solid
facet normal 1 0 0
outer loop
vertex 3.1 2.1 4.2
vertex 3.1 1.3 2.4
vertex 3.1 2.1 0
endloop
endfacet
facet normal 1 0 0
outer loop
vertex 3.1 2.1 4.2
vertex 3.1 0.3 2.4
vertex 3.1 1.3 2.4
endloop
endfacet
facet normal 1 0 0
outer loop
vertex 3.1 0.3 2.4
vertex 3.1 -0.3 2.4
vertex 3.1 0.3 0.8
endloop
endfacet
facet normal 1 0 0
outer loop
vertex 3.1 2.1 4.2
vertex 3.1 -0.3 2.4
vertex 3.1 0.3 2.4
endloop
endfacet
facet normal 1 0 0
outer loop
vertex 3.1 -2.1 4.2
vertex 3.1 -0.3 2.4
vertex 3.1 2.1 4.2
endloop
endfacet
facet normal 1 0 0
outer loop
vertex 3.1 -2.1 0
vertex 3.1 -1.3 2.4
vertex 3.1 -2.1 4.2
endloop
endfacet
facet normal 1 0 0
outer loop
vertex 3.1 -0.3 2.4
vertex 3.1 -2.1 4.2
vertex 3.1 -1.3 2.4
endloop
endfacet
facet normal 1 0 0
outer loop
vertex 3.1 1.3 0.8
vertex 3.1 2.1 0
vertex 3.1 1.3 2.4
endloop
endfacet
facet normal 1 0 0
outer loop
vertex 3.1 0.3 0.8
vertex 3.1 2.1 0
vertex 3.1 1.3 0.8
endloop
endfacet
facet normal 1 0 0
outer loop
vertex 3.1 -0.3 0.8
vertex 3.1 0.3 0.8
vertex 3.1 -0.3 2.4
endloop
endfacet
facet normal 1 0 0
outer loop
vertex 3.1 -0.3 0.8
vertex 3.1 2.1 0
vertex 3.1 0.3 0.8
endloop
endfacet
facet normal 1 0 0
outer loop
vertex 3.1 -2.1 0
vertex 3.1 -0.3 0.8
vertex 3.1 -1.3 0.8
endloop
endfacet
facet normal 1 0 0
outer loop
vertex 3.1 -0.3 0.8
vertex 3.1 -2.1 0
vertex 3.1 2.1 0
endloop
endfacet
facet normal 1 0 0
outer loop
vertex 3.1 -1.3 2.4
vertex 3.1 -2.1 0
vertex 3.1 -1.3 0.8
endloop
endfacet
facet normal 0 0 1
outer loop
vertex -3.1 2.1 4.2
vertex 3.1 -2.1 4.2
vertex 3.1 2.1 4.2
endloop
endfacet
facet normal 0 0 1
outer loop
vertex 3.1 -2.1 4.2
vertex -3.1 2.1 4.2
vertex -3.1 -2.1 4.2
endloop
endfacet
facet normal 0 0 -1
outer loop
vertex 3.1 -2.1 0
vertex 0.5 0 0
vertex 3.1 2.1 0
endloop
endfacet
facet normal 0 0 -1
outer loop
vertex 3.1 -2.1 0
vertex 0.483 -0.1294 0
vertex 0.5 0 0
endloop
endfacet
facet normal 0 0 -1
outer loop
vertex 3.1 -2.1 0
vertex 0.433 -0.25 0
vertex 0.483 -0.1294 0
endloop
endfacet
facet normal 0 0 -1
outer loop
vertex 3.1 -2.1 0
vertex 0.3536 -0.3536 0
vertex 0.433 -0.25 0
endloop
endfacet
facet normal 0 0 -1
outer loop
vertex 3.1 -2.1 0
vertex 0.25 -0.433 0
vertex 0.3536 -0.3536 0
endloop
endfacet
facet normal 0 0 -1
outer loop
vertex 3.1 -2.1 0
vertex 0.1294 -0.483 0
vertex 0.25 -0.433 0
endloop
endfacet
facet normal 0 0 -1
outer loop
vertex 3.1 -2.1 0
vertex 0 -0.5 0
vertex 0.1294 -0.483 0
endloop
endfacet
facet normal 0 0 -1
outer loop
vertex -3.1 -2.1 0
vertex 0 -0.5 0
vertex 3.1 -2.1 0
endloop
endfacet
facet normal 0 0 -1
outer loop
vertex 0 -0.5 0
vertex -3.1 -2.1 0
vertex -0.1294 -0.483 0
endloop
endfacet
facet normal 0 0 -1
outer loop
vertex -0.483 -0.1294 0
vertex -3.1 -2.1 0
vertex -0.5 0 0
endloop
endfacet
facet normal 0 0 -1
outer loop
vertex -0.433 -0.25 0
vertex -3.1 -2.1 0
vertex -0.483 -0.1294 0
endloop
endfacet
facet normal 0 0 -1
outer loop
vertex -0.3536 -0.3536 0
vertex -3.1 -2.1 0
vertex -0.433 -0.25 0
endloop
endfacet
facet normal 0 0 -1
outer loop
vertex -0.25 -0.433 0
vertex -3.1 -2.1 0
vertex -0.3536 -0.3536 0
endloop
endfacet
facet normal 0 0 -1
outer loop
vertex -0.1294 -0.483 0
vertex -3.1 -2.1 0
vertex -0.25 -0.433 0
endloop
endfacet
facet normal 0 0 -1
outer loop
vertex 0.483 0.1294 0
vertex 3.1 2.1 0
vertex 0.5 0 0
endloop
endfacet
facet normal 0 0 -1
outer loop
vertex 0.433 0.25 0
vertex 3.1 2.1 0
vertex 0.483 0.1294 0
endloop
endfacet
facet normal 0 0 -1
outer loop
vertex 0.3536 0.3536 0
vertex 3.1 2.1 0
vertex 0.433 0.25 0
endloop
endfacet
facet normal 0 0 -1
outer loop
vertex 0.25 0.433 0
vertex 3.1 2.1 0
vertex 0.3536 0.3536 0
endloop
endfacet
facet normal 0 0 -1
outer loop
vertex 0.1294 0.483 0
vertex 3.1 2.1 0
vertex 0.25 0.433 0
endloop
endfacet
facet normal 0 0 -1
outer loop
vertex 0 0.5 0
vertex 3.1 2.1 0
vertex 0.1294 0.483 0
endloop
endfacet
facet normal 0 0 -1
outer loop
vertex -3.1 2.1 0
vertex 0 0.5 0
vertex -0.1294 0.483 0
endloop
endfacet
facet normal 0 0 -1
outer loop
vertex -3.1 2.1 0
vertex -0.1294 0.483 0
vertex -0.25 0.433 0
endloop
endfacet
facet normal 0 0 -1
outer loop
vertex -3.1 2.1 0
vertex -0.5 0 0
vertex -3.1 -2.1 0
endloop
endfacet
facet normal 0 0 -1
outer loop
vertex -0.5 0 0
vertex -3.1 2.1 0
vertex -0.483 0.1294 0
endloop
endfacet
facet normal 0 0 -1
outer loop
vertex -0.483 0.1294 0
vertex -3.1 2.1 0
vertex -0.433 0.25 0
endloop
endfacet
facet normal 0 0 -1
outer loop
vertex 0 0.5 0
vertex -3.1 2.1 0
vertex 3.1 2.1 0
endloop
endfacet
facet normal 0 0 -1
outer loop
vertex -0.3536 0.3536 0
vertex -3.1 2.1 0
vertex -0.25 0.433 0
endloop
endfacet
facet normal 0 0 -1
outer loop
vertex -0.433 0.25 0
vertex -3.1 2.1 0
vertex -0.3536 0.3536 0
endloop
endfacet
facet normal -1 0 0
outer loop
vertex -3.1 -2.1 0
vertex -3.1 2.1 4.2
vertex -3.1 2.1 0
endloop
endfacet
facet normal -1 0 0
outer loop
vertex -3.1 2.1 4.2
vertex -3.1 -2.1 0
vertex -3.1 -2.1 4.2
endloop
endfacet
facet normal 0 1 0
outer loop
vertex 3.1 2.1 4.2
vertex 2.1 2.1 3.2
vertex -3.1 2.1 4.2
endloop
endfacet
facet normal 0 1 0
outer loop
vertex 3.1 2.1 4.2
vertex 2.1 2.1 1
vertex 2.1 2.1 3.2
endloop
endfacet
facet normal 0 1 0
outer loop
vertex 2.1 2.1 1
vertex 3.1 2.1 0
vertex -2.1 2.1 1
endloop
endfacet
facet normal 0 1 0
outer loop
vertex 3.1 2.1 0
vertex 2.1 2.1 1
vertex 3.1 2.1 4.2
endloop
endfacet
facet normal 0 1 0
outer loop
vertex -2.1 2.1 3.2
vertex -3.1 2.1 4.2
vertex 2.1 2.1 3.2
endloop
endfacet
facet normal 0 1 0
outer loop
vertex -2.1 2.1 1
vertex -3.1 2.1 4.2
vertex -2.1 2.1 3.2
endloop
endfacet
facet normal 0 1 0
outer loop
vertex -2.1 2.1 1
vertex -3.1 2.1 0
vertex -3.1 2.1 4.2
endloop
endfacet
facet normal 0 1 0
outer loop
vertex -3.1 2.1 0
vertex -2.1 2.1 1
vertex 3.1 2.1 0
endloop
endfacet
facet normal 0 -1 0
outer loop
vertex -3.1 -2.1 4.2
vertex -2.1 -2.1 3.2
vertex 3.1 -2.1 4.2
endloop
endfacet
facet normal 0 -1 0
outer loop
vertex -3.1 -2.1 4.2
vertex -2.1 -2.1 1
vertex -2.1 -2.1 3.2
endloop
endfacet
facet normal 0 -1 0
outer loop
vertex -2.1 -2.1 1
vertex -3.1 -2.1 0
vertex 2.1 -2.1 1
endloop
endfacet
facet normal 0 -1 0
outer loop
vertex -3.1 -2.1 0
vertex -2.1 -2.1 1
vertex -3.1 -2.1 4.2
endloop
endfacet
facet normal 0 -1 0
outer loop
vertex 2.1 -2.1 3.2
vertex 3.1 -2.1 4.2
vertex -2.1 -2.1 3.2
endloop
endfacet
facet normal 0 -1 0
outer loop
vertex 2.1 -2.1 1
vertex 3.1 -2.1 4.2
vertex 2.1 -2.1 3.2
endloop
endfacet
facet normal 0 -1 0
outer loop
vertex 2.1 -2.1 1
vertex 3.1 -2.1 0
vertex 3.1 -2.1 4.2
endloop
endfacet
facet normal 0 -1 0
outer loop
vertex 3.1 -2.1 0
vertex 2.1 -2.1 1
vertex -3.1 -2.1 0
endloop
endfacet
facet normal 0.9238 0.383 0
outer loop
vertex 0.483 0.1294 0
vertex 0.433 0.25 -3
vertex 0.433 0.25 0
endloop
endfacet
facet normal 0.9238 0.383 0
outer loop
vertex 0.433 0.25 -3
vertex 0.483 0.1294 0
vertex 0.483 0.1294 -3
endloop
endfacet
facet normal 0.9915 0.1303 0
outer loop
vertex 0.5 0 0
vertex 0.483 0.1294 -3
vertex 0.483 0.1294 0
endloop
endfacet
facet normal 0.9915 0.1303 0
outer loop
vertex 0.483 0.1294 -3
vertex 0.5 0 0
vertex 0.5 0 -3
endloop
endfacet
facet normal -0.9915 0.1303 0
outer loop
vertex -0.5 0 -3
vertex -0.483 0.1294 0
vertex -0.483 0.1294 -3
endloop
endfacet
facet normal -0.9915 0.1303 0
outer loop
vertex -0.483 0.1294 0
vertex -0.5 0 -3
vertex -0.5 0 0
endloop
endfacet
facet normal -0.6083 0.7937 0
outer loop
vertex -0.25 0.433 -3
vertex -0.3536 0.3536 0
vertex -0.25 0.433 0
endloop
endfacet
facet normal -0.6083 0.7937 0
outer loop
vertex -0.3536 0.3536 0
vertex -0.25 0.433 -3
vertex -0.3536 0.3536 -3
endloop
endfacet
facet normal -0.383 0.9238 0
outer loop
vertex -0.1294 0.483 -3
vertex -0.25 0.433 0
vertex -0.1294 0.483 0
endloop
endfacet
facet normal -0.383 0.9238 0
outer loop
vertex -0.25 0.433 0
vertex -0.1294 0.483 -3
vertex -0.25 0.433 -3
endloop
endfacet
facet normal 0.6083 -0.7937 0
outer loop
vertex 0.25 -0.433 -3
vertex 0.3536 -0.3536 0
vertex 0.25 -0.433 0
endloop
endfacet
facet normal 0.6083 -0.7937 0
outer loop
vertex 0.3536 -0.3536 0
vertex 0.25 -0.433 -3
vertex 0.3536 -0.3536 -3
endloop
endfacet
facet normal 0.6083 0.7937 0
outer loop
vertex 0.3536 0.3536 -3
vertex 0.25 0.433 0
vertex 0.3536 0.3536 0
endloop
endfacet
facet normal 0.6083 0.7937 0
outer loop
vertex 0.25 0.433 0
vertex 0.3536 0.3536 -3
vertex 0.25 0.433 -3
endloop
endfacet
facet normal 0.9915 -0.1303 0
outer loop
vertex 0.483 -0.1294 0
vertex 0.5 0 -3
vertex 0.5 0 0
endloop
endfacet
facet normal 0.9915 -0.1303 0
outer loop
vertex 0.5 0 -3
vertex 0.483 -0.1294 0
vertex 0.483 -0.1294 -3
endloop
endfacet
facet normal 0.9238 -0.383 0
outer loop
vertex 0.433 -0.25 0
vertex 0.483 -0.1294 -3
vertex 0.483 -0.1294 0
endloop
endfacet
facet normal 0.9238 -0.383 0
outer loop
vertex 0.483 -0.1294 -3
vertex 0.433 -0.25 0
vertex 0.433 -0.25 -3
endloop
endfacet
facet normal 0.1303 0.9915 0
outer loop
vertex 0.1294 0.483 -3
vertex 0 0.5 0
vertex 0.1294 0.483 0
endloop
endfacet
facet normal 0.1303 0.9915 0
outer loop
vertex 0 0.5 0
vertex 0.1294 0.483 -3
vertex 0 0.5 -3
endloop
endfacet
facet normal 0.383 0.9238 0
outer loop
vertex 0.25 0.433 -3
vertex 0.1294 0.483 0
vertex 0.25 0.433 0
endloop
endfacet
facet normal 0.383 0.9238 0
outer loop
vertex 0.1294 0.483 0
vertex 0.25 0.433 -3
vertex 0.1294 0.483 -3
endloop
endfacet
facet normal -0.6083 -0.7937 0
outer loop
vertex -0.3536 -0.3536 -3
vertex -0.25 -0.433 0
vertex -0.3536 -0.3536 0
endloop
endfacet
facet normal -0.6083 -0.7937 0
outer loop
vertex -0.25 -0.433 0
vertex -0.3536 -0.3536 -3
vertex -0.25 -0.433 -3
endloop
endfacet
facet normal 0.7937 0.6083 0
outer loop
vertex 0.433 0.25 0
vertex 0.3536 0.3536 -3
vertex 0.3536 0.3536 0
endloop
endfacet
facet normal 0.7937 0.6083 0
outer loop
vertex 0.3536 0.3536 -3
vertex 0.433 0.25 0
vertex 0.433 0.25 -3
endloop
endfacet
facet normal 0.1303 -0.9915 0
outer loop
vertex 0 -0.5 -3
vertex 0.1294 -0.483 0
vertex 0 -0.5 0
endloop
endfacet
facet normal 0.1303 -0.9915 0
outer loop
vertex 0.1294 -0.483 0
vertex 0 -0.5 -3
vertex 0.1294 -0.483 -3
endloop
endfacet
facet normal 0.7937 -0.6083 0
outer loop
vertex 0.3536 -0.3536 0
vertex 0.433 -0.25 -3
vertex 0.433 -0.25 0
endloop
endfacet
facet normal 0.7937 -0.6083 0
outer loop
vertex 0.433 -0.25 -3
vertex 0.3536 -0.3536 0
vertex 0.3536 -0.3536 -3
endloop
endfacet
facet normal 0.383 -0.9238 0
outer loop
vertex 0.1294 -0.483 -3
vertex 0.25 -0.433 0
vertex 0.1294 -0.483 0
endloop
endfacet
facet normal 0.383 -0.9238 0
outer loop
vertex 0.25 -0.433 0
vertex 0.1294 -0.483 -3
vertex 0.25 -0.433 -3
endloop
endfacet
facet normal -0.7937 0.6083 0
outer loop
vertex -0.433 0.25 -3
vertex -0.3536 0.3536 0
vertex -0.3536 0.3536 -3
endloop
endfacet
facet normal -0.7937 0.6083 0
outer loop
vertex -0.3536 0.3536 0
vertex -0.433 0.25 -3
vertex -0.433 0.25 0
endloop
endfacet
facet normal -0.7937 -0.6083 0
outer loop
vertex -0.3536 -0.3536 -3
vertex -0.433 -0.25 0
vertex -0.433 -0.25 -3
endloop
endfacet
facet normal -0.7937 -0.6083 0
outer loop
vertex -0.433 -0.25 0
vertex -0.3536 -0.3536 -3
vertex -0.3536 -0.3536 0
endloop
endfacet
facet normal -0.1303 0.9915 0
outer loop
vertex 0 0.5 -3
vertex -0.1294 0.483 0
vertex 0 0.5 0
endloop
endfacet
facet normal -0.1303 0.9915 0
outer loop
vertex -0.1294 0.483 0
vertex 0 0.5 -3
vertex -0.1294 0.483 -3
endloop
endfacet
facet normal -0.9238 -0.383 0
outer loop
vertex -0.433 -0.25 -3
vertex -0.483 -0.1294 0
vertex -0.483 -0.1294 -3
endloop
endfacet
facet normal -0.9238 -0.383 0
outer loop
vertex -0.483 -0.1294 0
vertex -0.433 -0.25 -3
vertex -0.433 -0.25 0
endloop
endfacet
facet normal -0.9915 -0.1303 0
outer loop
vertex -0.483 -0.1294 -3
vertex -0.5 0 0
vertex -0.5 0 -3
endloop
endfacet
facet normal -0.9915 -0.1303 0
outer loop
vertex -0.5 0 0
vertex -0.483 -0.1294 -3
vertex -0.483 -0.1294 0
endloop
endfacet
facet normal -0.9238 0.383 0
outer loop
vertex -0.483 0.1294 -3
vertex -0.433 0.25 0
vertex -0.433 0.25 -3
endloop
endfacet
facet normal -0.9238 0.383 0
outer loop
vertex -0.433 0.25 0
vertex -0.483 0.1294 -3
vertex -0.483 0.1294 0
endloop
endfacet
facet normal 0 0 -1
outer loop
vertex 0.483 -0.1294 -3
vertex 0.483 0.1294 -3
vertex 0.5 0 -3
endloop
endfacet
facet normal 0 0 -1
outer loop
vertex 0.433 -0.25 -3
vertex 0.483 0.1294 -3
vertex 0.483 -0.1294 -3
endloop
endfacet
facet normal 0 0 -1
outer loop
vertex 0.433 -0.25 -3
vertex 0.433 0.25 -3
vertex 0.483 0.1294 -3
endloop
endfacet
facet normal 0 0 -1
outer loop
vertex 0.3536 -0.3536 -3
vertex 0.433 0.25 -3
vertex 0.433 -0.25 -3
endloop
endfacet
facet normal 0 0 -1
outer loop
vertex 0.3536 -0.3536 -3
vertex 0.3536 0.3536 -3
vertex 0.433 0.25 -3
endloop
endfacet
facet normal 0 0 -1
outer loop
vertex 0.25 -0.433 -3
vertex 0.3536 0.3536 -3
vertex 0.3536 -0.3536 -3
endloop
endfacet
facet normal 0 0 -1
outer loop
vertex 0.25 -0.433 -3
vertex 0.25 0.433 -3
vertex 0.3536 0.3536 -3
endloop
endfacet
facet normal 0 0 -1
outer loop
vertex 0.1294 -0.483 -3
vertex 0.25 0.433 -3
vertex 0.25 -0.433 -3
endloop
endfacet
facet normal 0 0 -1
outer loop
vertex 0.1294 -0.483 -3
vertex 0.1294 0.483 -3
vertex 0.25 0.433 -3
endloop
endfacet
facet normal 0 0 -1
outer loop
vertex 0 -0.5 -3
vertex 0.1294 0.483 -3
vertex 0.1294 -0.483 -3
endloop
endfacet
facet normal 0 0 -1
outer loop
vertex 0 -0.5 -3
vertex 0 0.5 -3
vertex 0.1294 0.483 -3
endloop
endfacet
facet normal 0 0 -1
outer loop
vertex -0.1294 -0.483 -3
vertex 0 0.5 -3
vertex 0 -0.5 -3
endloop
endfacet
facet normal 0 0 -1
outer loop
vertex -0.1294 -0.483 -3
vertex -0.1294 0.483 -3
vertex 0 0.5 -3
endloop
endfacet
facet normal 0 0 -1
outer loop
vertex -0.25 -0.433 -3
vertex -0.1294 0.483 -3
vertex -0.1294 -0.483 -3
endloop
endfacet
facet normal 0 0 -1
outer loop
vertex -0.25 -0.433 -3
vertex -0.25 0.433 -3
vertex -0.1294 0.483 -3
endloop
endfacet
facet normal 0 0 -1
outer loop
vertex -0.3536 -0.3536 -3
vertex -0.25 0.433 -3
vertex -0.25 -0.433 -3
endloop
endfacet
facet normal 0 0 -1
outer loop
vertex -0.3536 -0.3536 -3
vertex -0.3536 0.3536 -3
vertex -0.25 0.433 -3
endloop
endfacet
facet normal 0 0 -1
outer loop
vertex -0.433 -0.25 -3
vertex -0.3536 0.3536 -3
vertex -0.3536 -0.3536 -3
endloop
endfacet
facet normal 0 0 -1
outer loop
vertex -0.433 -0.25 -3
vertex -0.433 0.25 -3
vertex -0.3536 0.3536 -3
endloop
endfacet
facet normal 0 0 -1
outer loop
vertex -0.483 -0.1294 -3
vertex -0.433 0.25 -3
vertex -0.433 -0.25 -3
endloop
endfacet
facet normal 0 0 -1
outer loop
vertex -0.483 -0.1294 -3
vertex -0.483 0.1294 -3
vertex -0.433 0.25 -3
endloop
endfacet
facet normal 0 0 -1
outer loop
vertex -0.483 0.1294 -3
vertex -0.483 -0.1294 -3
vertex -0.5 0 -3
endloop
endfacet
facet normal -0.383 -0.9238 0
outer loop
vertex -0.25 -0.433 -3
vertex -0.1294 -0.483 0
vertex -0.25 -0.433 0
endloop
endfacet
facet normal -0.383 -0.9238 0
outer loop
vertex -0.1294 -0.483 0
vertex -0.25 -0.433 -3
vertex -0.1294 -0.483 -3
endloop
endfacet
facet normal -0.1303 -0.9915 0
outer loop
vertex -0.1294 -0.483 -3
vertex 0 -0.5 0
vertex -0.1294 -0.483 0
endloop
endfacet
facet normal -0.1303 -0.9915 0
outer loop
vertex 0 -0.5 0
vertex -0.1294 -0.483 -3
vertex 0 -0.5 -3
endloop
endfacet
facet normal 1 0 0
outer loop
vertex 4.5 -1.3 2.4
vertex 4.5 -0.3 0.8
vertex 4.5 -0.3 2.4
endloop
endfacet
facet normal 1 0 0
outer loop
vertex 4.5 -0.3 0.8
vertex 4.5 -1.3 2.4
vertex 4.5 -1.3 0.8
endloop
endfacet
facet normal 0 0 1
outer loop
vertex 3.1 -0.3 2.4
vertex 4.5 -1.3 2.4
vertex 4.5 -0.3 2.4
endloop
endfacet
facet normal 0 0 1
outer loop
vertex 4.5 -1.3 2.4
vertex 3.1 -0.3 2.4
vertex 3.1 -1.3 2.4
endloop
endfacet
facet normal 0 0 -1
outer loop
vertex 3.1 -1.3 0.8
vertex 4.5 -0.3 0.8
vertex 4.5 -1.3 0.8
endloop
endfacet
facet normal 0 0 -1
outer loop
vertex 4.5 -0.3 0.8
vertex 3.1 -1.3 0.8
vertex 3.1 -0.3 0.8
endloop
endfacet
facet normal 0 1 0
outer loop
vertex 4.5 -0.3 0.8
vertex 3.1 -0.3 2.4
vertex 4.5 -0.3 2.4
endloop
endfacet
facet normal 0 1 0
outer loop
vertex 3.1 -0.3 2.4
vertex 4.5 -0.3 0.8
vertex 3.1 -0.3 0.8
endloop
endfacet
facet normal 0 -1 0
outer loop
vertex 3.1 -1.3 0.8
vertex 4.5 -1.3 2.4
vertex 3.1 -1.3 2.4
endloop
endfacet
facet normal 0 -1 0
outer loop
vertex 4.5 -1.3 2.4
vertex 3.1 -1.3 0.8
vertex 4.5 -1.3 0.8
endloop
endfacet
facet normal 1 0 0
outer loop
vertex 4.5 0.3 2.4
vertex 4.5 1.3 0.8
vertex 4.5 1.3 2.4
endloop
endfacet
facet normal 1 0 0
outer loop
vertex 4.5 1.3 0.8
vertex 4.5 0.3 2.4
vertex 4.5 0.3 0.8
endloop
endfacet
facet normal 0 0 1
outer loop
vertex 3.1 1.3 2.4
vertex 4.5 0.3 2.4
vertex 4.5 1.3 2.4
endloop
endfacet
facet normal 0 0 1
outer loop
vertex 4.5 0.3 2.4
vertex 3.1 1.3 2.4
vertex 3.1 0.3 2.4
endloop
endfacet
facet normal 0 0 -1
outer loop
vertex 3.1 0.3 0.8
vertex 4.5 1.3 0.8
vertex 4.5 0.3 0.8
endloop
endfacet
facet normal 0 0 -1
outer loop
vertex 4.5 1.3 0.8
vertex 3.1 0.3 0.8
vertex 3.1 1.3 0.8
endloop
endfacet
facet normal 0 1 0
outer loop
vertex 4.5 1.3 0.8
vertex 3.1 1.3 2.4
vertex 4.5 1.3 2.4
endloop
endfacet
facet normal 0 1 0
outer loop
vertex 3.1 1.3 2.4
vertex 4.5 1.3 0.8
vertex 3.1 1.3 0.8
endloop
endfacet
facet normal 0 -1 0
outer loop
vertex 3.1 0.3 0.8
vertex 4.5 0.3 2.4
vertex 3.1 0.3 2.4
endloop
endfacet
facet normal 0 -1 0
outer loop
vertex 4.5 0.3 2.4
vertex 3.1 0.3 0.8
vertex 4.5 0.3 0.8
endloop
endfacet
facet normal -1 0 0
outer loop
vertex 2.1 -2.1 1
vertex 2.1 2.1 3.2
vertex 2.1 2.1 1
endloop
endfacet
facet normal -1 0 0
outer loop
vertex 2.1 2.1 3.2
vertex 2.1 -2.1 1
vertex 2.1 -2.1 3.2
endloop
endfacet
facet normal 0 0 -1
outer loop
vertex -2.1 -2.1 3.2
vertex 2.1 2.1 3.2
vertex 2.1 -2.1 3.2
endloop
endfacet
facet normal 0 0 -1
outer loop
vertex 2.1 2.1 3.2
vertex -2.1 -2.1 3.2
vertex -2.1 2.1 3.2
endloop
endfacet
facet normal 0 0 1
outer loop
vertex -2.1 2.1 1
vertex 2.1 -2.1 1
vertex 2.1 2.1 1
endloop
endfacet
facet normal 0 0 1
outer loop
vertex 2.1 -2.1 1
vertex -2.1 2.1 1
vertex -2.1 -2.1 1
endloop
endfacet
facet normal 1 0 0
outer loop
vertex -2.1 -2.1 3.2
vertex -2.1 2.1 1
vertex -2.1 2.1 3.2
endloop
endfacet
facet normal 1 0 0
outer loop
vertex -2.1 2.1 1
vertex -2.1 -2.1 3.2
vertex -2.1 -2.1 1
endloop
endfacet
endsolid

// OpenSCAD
// part_id: cp2
// name: Slider (Metonic/Saros)
// source_drawing_ids: DRW-005
// units: mm
// revision: 0.1
// SPDX-License-Identifier: MIT

module part_cp2(w = 6.2, d = 4.2, h = 4.2,
                slot_w = 4.2, slot_h = 2.2,
                pin_d = 1.0, pin_h = 3.0,
                fork_w = 1.0, fork_gap = 0.6, fork_h = 1.6) {
    difference() {
        union() {
            translate([-w / 2, -d / 2, 0]) cube([w, d, h], center = false);
            // Lower pin.
            translate([0, 0, -pin_h]) cylinder(d = pin_d, h = pin_h, center = false, $fn = 24);
            // Small fork extension.
            translate([w / 2, -fork_w - fork_gap / 2, 0.8]) cube([1.4, fork_w, fork_h], center = false);
            translate([w / 2, fork_gap / 2, 0.8]) cube([1.4, fork_w, fork_h], center = false);
        }

        // Window slot through the body.
        translate([-slot_w / 2, -d / 2 - 0.1, (h - slot_h) / 2])
            cube([slot_w, d + 0.2, slot_h], center = false);
    }
}

// ---- "main guard" ----
// Default to previewing when opened directly:
if (is_undef(__LIB_MODE__)) {
    part_cp2();
}
